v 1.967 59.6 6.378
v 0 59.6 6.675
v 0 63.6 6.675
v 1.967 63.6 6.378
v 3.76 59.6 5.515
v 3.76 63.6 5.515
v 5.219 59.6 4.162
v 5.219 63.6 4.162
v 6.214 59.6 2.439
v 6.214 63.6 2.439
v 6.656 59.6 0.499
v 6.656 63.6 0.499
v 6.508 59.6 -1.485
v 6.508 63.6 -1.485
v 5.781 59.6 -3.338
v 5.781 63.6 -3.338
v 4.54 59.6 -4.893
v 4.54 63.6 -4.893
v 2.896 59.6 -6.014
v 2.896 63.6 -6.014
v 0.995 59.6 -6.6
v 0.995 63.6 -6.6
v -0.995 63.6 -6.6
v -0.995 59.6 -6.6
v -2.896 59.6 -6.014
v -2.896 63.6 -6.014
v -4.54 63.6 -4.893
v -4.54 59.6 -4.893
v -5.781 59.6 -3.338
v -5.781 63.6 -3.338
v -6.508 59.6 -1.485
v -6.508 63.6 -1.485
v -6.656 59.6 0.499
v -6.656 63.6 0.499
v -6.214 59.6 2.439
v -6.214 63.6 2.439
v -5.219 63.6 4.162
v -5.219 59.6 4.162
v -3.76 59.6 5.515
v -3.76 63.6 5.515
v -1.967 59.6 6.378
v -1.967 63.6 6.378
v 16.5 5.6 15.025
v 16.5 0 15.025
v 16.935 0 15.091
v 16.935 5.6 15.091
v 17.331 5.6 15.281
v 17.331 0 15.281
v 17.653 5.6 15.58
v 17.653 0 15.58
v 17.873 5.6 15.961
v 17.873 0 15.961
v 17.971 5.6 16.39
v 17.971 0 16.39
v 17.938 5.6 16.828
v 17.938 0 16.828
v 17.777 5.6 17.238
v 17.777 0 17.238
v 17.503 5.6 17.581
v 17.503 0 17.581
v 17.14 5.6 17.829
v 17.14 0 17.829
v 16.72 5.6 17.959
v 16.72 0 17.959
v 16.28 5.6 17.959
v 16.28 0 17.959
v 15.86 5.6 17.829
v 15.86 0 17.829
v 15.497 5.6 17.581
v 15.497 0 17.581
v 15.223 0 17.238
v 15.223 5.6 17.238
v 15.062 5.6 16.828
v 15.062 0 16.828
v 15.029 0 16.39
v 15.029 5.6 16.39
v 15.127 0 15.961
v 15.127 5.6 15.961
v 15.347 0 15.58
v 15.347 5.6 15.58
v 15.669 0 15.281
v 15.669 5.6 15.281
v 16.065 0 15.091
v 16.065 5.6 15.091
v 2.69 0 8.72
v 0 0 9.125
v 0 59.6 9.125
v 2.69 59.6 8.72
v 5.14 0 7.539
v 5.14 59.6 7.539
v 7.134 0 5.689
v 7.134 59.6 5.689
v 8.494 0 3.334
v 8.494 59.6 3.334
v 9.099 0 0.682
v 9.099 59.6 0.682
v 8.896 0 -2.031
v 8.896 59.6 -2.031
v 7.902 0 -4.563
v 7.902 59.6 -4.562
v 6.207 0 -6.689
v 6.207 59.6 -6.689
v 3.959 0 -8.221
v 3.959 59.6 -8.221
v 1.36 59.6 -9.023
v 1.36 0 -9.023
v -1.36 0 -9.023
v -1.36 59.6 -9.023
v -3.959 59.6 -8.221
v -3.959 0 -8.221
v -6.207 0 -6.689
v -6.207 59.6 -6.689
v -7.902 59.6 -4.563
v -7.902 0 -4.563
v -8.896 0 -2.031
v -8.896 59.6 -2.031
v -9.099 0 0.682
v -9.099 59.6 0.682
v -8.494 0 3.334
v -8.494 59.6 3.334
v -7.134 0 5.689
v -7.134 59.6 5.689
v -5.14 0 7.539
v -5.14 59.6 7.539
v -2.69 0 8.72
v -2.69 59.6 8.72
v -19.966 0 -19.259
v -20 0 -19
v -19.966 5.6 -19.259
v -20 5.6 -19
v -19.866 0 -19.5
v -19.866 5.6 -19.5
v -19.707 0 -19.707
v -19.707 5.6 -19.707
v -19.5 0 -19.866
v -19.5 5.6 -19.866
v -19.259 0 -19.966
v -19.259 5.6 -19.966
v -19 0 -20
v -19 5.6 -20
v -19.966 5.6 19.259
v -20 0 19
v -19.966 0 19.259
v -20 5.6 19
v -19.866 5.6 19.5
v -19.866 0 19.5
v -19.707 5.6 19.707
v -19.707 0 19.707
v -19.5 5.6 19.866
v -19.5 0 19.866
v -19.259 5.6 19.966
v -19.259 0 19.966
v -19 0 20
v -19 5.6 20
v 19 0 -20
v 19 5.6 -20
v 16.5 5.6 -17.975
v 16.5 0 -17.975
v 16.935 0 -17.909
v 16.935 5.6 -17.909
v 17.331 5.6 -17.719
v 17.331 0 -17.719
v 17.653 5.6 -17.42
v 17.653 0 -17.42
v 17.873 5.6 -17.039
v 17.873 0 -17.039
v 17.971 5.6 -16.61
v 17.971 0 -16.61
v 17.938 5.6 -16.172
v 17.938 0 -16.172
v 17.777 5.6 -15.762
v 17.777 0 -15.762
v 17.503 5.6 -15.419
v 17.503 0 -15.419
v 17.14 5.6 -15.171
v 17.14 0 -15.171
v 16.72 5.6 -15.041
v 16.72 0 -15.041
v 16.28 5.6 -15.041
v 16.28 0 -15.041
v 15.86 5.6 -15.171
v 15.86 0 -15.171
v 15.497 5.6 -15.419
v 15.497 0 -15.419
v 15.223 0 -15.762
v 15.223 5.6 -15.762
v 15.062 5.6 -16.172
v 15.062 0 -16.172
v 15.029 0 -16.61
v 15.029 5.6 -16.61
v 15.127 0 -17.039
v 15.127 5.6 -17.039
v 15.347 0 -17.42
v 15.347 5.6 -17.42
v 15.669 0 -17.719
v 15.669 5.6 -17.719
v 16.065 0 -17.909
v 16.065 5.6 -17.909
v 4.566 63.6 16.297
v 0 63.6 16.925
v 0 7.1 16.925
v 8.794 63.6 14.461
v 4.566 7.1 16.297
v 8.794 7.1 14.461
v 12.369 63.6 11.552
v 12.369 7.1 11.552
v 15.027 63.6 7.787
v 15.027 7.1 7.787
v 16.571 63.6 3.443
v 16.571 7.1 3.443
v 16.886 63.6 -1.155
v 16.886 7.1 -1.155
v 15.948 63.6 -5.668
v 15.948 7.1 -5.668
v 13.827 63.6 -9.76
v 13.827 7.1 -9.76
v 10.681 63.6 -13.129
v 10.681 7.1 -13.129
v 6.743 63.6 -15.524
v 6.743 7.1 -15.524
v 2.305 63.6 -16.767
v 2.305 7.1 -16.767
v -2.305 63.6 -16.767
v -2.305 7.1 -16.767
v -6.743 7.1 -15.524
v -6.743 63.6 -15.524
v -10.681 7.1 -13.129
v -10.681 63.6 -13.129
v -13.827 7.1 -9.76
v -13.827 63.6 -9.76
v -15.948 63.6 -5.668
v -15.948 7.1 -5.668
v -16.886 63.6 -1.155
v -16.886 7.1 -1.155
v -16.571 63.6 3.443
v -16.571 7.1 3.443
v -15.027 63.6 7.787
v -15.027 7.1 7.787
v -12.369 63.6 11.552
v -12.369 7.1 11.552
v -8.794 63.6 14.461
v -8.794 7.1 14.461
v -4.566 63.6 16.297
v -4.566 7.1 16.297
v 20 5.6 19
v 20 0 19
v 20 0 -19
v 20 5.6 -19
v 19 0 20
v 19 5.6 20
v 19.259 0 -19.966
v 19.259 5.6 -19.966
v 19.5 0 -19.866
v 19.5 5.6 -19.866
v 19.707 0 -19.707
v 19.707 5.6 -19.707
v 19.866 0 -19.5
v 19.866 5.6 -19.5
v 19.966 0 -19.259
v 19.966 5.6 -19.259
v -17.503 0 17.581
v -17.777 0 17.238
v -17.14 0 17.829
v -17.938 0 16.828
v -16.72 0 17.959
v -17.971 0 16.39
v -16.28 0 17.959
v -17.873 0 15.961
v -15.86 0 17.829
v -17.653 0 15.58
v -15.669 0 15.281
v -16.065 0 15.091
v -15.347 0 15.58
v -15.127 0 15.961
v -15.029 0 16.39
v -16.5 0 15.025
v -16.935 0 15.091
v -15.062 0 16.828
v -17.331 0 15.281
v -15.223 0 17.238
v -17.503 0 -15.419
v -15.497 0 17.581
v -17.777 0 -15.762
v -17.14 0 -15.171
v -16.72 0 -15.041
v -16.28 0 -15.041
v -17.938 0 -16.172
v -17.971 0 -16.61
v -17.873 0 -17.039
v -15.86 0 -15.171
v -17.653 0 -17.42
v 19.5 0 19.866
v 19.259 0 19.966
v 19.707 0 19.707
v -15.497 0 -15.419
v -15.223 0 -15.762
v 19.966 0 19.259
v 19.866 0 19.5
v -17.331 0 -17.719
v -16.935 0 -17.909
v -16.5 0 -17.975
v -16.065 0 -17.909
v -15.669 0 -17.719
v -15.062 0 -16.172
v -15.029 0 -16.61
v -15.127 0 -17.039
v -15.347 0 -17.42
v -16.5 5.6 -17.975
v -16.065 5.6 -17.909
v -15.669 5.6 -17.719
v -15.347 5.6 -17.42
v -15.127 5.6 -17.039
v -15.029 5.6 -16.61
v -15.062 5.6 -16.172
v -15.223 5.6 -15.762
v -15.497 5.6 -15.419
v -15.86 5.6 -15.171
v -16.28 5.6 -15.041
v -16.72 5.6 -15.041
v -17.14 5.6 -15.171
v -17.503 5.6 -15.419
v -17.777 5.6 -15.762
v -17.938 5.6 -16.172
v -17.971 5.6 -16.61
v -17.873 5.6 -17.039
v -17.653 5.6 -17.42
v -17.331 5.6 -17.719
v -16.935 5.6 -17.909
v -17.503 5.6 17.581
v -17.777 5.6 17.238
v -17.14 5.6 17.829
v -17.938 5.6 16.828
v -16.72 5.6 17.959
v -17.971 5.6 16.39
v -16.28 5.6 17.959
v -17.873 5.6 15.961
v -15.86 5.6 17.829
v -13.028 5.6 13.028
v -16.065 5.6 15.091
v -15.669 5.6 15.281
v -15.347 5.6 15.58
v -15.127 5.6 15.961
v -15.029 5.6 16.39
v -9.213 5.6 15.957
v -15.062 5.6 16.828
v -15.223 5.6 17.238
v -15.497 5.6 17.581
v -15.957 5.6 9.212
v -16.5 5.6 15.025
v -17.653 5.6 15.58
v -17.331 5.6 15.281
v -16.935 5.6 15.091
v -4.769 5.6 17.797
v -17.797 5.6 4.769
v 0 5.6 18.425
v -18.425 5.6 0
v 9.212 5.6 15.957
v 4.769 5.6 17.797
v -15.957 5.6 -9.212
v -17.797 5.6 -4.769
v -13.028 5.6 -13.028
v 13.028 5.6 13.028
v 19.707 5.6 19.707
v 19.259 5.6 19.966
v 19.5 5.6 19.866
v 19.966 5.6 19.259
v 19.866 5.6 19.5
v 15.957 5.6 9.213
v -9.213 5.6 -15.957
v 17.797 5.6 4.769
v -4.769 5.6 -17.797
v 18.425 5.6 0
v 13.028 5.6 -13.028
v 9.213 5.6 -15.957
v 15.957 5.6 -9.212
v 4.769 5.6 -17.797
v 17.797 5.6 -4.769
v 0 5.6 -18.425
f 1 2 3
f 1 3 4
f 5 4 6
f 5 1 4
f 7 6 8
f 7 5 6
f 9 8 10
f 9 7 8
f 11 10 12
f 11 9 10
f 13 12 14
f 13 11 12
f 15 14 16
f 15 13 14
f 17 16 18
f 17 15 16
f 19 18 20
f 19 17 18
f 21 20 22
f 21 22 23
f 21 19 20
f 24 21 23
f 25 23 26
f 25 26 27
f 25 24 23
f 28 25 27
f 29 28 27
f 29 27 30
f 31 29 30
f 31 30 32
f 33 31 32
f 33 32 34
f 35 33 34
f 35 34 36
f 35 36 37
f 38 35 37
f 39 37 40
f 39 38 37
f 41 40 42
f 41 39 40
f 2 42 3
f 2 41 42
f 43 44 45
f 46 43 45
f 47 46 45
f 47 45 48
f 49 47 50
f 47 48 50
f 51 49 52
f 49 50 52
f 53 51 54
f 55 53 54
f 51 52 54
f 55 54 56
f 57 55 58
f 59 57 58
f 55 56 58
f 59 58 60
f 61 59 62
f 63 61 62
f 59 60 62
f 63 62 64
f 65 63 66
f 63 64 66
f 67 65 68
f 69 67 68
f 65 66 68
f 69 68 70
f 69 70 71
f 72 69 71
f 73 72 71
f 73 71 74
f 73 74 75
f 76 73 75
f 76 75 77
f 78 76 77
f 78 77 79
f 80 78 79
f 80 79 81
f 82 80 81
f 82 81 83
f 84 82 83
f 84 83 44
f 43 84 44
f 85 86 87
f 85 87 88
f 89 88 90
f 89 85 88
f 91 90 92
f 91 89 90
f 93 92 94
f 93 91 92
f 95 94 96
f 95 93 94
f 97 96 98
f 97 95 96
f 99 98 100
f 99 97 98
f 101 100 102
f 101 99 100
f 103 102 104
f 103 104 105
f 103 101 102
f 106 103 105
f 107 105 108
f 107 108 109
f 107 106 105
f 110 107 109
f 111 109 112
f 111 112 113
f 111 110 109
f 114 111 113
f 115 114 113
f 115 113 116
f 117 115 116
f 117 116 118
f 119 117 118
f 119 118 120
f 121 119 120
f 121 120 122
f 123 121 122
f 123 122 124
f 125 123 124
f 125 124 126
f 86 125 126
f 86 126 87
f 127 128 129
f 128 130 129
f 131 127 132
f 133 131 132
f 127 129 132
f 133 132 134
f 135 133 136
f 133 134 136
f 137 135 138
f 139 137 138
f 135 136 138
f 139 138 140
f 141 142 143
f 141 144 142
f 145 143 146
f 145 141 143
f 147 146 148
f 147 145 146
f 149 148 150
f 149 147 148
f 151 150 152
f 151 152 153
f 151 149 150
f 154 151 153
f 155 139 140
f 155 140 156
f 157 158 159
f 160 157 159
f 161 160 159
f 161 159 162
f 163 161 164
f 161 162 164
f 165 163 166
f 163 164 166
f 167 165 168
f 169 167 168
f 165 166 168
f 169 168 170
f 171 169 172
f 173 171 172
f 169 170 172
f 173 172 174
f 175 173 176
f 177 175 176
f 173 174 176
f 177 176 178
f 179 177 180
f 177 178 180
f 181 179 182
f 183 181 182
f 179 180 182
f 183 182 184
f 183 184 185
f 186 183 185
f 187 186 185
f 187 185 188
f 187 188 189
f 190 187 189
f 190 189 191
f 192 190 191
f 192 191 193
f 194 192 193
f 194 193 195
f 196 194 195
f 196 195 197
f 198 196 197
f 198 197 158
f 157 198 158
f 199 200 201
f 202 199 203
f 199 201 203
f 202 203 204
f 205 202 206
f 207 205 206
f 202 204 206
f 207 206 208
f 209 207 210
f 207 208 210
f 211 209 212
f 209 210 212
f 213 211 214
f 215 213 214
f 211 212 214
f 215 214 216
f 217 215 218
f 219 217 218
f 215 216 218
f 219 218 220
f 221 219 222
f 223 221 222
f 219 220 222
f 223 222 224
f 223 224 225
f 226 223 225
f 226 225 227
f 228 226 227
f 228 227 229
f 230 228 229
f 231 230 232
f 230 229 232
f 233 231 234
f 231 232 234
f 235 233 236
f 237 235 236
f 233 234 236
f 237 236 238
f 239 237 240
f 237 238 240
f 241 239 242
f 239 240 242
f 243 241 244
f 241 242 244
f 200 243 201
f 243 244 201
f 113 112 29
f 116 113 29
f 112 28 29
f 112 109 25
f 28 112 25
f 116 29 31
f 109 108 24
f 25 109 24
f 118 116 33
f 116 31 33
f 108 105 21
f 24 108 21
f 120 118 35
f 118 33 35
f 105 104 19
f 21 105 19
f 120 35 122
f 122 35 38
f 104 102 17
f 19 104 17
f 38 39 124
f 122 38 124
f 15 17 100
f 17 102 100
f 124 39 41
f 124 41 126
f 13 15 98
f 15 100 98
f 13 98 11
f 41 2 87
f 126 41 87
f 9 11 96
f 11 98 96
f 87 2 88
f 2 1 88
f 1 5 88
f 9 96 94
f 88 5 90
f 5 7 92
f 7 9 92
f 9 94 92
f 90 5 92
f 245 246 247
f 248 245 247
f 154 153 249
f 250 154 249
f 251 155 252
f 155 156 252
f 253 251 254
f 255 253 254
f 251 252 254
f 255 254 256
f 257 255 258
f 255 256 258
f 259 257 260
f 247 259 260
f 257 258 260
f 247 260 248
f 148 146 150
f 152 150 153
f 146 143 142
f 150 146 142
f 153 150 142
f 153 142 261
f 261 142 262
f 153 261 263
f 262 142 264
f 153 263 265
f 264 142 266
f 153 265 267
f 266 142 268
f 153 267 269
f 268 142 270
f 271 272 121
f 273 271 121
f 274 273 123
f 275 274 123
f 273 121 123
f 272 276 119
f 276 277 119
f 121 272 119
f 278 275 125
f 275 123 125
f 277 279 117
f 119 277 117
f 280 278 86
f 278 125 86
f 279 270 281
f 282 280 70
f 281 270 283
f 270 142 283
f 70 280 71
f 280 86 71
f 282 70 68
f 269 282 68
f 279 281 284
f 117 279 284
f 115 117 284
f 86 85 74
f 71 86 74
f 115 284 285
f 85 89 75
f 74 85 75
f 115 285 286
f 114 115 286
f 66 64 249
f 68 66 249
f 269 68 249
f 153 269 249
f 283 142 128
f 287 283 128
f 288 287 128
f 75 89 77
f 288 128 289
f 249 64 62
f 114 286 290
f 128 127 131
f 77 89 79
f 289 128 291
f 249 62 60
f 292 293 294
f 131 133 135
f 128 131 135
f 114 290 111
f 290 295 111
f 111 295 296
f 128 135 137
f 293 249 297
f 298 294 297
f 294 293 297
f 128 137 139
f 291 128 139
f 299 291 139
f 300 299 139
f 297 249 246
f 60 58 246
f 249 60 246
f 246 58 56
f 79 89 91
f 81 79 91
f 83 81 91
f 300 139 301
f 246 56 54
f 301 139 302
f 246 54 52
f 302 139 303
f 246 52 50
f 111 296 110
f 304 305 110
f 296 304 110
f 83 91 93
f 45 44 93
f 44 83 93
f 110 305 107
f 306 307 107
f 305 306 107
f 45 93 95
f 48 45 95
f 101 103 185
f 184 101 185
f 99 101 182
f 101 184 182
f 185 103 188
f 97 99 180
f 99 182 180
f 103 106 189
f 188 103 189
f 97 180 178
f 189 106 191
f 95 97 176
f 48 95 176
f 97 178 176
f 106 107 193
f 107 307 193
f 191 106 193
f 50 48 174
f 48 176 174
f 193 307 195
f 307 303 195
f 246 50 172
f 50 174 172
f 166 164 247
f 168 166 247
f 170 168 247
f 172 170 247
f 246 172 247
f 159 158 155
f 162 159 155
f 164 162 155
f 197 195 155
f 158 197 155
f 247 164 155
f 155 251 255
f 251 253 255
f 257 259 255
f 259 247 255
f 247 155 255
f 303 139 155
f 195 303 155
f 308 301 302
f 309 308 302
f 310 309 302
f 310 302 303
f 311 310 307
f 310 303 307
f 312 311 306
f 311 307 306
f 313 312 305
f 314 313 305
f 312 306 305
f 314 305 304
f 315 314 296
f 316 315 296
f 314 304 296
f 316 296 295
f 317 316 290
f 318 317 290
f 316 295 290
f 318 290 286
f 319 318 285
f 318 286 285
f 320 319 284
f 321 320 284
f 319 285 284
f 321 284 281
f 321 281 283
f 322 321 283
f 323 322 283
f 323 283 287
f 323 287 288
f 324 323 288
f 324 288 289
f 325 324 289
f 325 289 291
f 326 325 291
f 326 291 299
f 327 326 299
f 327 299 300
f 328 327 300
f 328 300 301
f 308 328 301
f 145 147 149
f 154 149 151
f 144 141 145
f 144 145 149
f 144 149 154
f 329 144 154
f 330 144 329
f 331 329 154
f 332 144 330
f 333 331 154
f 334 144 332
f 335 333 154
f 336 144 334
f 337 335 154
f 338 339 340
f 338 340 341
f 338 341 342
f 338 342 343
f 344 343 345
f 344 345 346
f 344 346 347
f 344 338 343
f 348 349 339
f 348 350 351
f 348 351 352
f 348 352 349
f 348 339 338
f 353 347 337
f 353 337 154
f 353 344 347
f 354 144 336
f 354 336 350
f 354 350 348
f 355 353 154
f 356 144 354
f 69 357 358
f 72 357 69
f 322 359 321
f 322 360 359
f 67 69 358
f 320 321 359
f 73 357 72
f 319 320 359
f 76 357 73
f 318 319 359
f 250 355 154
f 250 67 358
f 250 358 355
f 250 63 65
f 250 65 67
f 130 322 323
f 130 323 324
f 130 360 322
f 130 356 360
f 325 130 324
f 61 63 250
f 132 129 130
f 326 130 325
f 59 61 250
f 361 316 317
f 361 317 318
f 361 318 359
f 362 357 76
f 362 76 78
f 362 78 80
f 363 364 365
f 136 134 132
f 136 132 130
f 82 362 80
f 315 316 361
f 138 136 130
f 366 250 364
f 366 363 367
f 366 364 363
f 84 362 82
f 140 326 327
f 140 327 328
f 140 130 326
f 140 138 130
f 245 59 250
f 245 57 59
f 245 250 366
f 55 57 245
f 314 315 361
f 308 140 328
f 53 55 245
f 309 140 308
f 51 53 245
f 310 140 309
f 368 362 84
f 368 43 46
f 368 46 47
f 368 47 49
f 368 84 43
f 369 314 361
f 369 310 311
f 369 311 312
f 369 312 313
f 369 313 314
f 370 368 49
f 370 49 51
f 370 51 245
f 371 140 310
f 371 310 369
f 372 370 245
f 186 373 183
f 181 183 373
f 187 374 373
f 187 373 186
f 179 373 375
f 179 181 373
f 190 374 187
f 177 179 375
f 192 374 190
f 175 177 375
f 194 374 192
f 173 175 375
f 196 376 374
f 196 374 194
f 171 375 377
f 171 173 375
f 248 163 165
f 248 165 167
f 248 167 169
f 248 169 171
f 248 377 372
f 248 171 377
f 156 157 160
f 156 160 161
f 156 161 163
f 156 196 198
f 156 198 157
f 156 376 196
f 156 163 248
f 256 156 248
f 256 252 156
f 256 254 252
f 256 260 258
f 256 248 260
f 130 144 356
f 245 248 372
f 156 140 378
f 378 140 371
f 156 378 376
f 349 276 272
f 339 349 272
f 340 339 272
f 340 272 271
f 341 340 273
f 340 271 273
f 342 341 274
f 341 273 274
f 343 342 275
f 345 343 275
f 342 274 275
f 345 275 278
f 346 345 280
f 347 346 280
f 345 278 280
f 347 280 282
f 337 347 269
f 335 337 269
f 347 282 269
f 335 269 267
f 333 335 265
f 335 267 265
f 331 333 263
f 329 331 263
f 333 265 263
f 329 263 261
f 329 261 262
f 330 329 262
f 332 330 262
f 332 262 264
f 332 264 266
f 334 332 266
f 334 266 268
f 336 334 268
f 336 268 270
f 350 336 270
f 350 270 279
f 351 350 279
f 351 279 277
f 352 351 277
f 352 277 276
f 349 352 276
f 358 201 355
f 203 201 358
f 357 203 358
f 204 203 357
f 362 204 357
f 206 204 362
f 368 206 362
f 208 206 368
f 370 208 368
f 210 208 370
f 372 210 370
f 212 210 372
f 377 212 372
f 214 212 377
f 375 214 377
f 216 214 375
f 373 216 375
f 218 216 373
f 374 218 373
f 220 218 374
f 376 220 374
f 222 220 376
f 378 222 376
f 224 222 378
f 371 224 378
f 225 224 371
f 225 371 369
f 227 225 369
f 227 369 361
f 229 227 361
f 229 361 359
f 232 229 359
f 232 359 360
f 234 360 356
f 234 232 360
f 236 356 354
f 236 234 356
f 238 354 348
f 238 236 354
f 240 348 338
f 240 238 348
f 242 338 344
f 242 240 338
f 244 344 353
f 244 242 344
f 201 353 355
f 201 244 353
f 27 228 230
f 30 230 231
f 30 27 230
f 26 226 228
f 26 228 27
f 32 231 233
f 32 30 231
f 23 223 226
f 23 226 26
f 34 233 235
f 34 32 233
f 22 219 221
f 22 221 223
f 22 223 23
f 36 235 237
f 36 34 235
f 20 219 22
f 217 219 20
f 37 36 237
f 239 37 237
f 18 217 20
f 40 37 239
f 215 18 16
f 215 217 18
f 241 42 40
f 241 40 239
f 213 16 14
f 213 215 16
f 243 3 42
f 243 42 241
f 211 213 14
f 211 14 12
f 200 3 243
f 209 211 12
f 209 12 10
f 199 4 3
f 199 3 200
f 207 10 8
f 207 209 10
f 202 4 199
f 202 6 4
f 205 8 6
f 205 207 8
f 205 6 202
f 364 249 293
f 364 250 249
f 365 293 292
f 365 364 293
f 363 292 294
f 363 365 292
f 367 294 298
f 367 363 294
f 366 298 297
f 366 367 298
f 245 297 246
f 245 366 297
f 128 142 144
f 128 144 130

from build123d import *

# Parameters (mm, degrees)
SKETCH1_W           = 40
SKETCH1_H           = 40
BOSS_EXTRUDE1_DEPTH = 5.6
SKETCH2_R           = 16.925
SKETCH2_R_2         = 9.125
BOSS_EXTRUDE2_DEPTH = 54
SKETCH3_R           = 1.475
CUT_EXTRUDE1_DEPTH  = 10
FILLET1_R           = 1
CHAMFER1_SIZE       = 1.5
CUT_EXTRUDE2_START  = -10
SKETCH4_R           = 9.125
CUT_EXTRUDE2_DEPTH  = 10
SKETCH5_R           = 16.925
SKETCH5_R_2         = 6.675
BOSS_EXTRUDE3_DEPTH = 4


with BuildPart() as part:
    # Sketch1 → Boss-Extrude1 (new body)
    with BuildSketch(Plane(origin=(0, 0, 0), x_dir=(1, 0, 0), z_dir=(0, 1, 0))):
        Rectangle(SKETCH1_W, SKETCH1_H)
    extrude(amount=BOSS_EXTRUDE1_DEPTH)

    # Sketch2 → Boss-Extrude2 (add)
    with BuildSketch(Plane(origin=(0, 5.6, 0), x_dir=(1, 0, 0), z_dir=(0, 1, 0))):
        with Locations(Location((0, 0, 0), (0, 0, 270))):
            Circle(SKETCH2_R)
        with Locations(Location((0, 0, 0), (0, 0, 270))):
            Circle(SKETCH2_R_2, mode=Mode.SUBTRACT)
    extrude(amount=BOSS_EXTRUDE2_DEPTH)

    # Sketch3 → Cut-Extrude1 (cut)
    with BuildSketch(Plane.XZ):
        with Locations(Location((-16.5, -16.5, 0), (0, 0, 270))):
            Circle(SKETCH3_R)
        with Locations(Location((-16.5, 16.5, 0), (0, 0, 270))):
            Circle(SKETCH3_R)
        with Locations(Location((16.5, 16.5, 0), (0, 0, 270))):
            Circle(SKETCH3_R)
        with Locations(Location((16.5, -16.5, 0), (0, 0, 270))):
            Circle(SKETCH3_R)
    extrude(amount=-CUT_EXTRUDE1_DEPTH, mode=Mode.SUBTRACT)

    # Fillet1
    fillet1_edges = [part.edges().sort_by_distance(p)[0] for p in [
        (20, 2.8, 20),
        (-20, 2.8, 20),
        (-20, 2.8, -20),
        (20, 2.8, -20),
    ]]
    fillet(fillet1_edges, radius=FILLET1_R)

    # Chamfer1
    chamfer1_edges = [part.edges().sort_by_distance(p)[0] for p in [
        (0, 5.6, -16.925),
    ]]
    chamfer(chamfer1_edges, length=CHAMFER1_SIZE)

    # Sketch4 → Cut-Extrude2 (cut)
    with BuildSketch(Plane(origin=(0, 5.6, 0), x_dir=(1, 0, 0), z_dir=(0, 1, 0)).offset(CUT_EXTRUDE2_START)):
        with Locations(Location((0, 0, 0), (0, 0, 270))):
            Circle(SKETCH4_R)
    extrude(amount=CUT_EXTRUDE2_DEPTH, mode=Mode.SUBTRACT)

    # Sketch5 → Boss-Extrude3 (add)
    with BuildSketch(Plane(origin=(0, 59.6, 0), x_dir=(1, 0, 0), z_dir=(0, 1, 0))):
        with Locations(Location((0, 0, 0), (0, 0, 270))):
            Circle(SKETCH5_R)
        with Locations(Location((0, 0, 0), (0, 0, 270))):
            Circle(SKETCH5_R_2, mode=Mode.SUBTRACT)
    extrude(amount=BOSS_EXTRUDE3_DEPTH)


solid = part.part
